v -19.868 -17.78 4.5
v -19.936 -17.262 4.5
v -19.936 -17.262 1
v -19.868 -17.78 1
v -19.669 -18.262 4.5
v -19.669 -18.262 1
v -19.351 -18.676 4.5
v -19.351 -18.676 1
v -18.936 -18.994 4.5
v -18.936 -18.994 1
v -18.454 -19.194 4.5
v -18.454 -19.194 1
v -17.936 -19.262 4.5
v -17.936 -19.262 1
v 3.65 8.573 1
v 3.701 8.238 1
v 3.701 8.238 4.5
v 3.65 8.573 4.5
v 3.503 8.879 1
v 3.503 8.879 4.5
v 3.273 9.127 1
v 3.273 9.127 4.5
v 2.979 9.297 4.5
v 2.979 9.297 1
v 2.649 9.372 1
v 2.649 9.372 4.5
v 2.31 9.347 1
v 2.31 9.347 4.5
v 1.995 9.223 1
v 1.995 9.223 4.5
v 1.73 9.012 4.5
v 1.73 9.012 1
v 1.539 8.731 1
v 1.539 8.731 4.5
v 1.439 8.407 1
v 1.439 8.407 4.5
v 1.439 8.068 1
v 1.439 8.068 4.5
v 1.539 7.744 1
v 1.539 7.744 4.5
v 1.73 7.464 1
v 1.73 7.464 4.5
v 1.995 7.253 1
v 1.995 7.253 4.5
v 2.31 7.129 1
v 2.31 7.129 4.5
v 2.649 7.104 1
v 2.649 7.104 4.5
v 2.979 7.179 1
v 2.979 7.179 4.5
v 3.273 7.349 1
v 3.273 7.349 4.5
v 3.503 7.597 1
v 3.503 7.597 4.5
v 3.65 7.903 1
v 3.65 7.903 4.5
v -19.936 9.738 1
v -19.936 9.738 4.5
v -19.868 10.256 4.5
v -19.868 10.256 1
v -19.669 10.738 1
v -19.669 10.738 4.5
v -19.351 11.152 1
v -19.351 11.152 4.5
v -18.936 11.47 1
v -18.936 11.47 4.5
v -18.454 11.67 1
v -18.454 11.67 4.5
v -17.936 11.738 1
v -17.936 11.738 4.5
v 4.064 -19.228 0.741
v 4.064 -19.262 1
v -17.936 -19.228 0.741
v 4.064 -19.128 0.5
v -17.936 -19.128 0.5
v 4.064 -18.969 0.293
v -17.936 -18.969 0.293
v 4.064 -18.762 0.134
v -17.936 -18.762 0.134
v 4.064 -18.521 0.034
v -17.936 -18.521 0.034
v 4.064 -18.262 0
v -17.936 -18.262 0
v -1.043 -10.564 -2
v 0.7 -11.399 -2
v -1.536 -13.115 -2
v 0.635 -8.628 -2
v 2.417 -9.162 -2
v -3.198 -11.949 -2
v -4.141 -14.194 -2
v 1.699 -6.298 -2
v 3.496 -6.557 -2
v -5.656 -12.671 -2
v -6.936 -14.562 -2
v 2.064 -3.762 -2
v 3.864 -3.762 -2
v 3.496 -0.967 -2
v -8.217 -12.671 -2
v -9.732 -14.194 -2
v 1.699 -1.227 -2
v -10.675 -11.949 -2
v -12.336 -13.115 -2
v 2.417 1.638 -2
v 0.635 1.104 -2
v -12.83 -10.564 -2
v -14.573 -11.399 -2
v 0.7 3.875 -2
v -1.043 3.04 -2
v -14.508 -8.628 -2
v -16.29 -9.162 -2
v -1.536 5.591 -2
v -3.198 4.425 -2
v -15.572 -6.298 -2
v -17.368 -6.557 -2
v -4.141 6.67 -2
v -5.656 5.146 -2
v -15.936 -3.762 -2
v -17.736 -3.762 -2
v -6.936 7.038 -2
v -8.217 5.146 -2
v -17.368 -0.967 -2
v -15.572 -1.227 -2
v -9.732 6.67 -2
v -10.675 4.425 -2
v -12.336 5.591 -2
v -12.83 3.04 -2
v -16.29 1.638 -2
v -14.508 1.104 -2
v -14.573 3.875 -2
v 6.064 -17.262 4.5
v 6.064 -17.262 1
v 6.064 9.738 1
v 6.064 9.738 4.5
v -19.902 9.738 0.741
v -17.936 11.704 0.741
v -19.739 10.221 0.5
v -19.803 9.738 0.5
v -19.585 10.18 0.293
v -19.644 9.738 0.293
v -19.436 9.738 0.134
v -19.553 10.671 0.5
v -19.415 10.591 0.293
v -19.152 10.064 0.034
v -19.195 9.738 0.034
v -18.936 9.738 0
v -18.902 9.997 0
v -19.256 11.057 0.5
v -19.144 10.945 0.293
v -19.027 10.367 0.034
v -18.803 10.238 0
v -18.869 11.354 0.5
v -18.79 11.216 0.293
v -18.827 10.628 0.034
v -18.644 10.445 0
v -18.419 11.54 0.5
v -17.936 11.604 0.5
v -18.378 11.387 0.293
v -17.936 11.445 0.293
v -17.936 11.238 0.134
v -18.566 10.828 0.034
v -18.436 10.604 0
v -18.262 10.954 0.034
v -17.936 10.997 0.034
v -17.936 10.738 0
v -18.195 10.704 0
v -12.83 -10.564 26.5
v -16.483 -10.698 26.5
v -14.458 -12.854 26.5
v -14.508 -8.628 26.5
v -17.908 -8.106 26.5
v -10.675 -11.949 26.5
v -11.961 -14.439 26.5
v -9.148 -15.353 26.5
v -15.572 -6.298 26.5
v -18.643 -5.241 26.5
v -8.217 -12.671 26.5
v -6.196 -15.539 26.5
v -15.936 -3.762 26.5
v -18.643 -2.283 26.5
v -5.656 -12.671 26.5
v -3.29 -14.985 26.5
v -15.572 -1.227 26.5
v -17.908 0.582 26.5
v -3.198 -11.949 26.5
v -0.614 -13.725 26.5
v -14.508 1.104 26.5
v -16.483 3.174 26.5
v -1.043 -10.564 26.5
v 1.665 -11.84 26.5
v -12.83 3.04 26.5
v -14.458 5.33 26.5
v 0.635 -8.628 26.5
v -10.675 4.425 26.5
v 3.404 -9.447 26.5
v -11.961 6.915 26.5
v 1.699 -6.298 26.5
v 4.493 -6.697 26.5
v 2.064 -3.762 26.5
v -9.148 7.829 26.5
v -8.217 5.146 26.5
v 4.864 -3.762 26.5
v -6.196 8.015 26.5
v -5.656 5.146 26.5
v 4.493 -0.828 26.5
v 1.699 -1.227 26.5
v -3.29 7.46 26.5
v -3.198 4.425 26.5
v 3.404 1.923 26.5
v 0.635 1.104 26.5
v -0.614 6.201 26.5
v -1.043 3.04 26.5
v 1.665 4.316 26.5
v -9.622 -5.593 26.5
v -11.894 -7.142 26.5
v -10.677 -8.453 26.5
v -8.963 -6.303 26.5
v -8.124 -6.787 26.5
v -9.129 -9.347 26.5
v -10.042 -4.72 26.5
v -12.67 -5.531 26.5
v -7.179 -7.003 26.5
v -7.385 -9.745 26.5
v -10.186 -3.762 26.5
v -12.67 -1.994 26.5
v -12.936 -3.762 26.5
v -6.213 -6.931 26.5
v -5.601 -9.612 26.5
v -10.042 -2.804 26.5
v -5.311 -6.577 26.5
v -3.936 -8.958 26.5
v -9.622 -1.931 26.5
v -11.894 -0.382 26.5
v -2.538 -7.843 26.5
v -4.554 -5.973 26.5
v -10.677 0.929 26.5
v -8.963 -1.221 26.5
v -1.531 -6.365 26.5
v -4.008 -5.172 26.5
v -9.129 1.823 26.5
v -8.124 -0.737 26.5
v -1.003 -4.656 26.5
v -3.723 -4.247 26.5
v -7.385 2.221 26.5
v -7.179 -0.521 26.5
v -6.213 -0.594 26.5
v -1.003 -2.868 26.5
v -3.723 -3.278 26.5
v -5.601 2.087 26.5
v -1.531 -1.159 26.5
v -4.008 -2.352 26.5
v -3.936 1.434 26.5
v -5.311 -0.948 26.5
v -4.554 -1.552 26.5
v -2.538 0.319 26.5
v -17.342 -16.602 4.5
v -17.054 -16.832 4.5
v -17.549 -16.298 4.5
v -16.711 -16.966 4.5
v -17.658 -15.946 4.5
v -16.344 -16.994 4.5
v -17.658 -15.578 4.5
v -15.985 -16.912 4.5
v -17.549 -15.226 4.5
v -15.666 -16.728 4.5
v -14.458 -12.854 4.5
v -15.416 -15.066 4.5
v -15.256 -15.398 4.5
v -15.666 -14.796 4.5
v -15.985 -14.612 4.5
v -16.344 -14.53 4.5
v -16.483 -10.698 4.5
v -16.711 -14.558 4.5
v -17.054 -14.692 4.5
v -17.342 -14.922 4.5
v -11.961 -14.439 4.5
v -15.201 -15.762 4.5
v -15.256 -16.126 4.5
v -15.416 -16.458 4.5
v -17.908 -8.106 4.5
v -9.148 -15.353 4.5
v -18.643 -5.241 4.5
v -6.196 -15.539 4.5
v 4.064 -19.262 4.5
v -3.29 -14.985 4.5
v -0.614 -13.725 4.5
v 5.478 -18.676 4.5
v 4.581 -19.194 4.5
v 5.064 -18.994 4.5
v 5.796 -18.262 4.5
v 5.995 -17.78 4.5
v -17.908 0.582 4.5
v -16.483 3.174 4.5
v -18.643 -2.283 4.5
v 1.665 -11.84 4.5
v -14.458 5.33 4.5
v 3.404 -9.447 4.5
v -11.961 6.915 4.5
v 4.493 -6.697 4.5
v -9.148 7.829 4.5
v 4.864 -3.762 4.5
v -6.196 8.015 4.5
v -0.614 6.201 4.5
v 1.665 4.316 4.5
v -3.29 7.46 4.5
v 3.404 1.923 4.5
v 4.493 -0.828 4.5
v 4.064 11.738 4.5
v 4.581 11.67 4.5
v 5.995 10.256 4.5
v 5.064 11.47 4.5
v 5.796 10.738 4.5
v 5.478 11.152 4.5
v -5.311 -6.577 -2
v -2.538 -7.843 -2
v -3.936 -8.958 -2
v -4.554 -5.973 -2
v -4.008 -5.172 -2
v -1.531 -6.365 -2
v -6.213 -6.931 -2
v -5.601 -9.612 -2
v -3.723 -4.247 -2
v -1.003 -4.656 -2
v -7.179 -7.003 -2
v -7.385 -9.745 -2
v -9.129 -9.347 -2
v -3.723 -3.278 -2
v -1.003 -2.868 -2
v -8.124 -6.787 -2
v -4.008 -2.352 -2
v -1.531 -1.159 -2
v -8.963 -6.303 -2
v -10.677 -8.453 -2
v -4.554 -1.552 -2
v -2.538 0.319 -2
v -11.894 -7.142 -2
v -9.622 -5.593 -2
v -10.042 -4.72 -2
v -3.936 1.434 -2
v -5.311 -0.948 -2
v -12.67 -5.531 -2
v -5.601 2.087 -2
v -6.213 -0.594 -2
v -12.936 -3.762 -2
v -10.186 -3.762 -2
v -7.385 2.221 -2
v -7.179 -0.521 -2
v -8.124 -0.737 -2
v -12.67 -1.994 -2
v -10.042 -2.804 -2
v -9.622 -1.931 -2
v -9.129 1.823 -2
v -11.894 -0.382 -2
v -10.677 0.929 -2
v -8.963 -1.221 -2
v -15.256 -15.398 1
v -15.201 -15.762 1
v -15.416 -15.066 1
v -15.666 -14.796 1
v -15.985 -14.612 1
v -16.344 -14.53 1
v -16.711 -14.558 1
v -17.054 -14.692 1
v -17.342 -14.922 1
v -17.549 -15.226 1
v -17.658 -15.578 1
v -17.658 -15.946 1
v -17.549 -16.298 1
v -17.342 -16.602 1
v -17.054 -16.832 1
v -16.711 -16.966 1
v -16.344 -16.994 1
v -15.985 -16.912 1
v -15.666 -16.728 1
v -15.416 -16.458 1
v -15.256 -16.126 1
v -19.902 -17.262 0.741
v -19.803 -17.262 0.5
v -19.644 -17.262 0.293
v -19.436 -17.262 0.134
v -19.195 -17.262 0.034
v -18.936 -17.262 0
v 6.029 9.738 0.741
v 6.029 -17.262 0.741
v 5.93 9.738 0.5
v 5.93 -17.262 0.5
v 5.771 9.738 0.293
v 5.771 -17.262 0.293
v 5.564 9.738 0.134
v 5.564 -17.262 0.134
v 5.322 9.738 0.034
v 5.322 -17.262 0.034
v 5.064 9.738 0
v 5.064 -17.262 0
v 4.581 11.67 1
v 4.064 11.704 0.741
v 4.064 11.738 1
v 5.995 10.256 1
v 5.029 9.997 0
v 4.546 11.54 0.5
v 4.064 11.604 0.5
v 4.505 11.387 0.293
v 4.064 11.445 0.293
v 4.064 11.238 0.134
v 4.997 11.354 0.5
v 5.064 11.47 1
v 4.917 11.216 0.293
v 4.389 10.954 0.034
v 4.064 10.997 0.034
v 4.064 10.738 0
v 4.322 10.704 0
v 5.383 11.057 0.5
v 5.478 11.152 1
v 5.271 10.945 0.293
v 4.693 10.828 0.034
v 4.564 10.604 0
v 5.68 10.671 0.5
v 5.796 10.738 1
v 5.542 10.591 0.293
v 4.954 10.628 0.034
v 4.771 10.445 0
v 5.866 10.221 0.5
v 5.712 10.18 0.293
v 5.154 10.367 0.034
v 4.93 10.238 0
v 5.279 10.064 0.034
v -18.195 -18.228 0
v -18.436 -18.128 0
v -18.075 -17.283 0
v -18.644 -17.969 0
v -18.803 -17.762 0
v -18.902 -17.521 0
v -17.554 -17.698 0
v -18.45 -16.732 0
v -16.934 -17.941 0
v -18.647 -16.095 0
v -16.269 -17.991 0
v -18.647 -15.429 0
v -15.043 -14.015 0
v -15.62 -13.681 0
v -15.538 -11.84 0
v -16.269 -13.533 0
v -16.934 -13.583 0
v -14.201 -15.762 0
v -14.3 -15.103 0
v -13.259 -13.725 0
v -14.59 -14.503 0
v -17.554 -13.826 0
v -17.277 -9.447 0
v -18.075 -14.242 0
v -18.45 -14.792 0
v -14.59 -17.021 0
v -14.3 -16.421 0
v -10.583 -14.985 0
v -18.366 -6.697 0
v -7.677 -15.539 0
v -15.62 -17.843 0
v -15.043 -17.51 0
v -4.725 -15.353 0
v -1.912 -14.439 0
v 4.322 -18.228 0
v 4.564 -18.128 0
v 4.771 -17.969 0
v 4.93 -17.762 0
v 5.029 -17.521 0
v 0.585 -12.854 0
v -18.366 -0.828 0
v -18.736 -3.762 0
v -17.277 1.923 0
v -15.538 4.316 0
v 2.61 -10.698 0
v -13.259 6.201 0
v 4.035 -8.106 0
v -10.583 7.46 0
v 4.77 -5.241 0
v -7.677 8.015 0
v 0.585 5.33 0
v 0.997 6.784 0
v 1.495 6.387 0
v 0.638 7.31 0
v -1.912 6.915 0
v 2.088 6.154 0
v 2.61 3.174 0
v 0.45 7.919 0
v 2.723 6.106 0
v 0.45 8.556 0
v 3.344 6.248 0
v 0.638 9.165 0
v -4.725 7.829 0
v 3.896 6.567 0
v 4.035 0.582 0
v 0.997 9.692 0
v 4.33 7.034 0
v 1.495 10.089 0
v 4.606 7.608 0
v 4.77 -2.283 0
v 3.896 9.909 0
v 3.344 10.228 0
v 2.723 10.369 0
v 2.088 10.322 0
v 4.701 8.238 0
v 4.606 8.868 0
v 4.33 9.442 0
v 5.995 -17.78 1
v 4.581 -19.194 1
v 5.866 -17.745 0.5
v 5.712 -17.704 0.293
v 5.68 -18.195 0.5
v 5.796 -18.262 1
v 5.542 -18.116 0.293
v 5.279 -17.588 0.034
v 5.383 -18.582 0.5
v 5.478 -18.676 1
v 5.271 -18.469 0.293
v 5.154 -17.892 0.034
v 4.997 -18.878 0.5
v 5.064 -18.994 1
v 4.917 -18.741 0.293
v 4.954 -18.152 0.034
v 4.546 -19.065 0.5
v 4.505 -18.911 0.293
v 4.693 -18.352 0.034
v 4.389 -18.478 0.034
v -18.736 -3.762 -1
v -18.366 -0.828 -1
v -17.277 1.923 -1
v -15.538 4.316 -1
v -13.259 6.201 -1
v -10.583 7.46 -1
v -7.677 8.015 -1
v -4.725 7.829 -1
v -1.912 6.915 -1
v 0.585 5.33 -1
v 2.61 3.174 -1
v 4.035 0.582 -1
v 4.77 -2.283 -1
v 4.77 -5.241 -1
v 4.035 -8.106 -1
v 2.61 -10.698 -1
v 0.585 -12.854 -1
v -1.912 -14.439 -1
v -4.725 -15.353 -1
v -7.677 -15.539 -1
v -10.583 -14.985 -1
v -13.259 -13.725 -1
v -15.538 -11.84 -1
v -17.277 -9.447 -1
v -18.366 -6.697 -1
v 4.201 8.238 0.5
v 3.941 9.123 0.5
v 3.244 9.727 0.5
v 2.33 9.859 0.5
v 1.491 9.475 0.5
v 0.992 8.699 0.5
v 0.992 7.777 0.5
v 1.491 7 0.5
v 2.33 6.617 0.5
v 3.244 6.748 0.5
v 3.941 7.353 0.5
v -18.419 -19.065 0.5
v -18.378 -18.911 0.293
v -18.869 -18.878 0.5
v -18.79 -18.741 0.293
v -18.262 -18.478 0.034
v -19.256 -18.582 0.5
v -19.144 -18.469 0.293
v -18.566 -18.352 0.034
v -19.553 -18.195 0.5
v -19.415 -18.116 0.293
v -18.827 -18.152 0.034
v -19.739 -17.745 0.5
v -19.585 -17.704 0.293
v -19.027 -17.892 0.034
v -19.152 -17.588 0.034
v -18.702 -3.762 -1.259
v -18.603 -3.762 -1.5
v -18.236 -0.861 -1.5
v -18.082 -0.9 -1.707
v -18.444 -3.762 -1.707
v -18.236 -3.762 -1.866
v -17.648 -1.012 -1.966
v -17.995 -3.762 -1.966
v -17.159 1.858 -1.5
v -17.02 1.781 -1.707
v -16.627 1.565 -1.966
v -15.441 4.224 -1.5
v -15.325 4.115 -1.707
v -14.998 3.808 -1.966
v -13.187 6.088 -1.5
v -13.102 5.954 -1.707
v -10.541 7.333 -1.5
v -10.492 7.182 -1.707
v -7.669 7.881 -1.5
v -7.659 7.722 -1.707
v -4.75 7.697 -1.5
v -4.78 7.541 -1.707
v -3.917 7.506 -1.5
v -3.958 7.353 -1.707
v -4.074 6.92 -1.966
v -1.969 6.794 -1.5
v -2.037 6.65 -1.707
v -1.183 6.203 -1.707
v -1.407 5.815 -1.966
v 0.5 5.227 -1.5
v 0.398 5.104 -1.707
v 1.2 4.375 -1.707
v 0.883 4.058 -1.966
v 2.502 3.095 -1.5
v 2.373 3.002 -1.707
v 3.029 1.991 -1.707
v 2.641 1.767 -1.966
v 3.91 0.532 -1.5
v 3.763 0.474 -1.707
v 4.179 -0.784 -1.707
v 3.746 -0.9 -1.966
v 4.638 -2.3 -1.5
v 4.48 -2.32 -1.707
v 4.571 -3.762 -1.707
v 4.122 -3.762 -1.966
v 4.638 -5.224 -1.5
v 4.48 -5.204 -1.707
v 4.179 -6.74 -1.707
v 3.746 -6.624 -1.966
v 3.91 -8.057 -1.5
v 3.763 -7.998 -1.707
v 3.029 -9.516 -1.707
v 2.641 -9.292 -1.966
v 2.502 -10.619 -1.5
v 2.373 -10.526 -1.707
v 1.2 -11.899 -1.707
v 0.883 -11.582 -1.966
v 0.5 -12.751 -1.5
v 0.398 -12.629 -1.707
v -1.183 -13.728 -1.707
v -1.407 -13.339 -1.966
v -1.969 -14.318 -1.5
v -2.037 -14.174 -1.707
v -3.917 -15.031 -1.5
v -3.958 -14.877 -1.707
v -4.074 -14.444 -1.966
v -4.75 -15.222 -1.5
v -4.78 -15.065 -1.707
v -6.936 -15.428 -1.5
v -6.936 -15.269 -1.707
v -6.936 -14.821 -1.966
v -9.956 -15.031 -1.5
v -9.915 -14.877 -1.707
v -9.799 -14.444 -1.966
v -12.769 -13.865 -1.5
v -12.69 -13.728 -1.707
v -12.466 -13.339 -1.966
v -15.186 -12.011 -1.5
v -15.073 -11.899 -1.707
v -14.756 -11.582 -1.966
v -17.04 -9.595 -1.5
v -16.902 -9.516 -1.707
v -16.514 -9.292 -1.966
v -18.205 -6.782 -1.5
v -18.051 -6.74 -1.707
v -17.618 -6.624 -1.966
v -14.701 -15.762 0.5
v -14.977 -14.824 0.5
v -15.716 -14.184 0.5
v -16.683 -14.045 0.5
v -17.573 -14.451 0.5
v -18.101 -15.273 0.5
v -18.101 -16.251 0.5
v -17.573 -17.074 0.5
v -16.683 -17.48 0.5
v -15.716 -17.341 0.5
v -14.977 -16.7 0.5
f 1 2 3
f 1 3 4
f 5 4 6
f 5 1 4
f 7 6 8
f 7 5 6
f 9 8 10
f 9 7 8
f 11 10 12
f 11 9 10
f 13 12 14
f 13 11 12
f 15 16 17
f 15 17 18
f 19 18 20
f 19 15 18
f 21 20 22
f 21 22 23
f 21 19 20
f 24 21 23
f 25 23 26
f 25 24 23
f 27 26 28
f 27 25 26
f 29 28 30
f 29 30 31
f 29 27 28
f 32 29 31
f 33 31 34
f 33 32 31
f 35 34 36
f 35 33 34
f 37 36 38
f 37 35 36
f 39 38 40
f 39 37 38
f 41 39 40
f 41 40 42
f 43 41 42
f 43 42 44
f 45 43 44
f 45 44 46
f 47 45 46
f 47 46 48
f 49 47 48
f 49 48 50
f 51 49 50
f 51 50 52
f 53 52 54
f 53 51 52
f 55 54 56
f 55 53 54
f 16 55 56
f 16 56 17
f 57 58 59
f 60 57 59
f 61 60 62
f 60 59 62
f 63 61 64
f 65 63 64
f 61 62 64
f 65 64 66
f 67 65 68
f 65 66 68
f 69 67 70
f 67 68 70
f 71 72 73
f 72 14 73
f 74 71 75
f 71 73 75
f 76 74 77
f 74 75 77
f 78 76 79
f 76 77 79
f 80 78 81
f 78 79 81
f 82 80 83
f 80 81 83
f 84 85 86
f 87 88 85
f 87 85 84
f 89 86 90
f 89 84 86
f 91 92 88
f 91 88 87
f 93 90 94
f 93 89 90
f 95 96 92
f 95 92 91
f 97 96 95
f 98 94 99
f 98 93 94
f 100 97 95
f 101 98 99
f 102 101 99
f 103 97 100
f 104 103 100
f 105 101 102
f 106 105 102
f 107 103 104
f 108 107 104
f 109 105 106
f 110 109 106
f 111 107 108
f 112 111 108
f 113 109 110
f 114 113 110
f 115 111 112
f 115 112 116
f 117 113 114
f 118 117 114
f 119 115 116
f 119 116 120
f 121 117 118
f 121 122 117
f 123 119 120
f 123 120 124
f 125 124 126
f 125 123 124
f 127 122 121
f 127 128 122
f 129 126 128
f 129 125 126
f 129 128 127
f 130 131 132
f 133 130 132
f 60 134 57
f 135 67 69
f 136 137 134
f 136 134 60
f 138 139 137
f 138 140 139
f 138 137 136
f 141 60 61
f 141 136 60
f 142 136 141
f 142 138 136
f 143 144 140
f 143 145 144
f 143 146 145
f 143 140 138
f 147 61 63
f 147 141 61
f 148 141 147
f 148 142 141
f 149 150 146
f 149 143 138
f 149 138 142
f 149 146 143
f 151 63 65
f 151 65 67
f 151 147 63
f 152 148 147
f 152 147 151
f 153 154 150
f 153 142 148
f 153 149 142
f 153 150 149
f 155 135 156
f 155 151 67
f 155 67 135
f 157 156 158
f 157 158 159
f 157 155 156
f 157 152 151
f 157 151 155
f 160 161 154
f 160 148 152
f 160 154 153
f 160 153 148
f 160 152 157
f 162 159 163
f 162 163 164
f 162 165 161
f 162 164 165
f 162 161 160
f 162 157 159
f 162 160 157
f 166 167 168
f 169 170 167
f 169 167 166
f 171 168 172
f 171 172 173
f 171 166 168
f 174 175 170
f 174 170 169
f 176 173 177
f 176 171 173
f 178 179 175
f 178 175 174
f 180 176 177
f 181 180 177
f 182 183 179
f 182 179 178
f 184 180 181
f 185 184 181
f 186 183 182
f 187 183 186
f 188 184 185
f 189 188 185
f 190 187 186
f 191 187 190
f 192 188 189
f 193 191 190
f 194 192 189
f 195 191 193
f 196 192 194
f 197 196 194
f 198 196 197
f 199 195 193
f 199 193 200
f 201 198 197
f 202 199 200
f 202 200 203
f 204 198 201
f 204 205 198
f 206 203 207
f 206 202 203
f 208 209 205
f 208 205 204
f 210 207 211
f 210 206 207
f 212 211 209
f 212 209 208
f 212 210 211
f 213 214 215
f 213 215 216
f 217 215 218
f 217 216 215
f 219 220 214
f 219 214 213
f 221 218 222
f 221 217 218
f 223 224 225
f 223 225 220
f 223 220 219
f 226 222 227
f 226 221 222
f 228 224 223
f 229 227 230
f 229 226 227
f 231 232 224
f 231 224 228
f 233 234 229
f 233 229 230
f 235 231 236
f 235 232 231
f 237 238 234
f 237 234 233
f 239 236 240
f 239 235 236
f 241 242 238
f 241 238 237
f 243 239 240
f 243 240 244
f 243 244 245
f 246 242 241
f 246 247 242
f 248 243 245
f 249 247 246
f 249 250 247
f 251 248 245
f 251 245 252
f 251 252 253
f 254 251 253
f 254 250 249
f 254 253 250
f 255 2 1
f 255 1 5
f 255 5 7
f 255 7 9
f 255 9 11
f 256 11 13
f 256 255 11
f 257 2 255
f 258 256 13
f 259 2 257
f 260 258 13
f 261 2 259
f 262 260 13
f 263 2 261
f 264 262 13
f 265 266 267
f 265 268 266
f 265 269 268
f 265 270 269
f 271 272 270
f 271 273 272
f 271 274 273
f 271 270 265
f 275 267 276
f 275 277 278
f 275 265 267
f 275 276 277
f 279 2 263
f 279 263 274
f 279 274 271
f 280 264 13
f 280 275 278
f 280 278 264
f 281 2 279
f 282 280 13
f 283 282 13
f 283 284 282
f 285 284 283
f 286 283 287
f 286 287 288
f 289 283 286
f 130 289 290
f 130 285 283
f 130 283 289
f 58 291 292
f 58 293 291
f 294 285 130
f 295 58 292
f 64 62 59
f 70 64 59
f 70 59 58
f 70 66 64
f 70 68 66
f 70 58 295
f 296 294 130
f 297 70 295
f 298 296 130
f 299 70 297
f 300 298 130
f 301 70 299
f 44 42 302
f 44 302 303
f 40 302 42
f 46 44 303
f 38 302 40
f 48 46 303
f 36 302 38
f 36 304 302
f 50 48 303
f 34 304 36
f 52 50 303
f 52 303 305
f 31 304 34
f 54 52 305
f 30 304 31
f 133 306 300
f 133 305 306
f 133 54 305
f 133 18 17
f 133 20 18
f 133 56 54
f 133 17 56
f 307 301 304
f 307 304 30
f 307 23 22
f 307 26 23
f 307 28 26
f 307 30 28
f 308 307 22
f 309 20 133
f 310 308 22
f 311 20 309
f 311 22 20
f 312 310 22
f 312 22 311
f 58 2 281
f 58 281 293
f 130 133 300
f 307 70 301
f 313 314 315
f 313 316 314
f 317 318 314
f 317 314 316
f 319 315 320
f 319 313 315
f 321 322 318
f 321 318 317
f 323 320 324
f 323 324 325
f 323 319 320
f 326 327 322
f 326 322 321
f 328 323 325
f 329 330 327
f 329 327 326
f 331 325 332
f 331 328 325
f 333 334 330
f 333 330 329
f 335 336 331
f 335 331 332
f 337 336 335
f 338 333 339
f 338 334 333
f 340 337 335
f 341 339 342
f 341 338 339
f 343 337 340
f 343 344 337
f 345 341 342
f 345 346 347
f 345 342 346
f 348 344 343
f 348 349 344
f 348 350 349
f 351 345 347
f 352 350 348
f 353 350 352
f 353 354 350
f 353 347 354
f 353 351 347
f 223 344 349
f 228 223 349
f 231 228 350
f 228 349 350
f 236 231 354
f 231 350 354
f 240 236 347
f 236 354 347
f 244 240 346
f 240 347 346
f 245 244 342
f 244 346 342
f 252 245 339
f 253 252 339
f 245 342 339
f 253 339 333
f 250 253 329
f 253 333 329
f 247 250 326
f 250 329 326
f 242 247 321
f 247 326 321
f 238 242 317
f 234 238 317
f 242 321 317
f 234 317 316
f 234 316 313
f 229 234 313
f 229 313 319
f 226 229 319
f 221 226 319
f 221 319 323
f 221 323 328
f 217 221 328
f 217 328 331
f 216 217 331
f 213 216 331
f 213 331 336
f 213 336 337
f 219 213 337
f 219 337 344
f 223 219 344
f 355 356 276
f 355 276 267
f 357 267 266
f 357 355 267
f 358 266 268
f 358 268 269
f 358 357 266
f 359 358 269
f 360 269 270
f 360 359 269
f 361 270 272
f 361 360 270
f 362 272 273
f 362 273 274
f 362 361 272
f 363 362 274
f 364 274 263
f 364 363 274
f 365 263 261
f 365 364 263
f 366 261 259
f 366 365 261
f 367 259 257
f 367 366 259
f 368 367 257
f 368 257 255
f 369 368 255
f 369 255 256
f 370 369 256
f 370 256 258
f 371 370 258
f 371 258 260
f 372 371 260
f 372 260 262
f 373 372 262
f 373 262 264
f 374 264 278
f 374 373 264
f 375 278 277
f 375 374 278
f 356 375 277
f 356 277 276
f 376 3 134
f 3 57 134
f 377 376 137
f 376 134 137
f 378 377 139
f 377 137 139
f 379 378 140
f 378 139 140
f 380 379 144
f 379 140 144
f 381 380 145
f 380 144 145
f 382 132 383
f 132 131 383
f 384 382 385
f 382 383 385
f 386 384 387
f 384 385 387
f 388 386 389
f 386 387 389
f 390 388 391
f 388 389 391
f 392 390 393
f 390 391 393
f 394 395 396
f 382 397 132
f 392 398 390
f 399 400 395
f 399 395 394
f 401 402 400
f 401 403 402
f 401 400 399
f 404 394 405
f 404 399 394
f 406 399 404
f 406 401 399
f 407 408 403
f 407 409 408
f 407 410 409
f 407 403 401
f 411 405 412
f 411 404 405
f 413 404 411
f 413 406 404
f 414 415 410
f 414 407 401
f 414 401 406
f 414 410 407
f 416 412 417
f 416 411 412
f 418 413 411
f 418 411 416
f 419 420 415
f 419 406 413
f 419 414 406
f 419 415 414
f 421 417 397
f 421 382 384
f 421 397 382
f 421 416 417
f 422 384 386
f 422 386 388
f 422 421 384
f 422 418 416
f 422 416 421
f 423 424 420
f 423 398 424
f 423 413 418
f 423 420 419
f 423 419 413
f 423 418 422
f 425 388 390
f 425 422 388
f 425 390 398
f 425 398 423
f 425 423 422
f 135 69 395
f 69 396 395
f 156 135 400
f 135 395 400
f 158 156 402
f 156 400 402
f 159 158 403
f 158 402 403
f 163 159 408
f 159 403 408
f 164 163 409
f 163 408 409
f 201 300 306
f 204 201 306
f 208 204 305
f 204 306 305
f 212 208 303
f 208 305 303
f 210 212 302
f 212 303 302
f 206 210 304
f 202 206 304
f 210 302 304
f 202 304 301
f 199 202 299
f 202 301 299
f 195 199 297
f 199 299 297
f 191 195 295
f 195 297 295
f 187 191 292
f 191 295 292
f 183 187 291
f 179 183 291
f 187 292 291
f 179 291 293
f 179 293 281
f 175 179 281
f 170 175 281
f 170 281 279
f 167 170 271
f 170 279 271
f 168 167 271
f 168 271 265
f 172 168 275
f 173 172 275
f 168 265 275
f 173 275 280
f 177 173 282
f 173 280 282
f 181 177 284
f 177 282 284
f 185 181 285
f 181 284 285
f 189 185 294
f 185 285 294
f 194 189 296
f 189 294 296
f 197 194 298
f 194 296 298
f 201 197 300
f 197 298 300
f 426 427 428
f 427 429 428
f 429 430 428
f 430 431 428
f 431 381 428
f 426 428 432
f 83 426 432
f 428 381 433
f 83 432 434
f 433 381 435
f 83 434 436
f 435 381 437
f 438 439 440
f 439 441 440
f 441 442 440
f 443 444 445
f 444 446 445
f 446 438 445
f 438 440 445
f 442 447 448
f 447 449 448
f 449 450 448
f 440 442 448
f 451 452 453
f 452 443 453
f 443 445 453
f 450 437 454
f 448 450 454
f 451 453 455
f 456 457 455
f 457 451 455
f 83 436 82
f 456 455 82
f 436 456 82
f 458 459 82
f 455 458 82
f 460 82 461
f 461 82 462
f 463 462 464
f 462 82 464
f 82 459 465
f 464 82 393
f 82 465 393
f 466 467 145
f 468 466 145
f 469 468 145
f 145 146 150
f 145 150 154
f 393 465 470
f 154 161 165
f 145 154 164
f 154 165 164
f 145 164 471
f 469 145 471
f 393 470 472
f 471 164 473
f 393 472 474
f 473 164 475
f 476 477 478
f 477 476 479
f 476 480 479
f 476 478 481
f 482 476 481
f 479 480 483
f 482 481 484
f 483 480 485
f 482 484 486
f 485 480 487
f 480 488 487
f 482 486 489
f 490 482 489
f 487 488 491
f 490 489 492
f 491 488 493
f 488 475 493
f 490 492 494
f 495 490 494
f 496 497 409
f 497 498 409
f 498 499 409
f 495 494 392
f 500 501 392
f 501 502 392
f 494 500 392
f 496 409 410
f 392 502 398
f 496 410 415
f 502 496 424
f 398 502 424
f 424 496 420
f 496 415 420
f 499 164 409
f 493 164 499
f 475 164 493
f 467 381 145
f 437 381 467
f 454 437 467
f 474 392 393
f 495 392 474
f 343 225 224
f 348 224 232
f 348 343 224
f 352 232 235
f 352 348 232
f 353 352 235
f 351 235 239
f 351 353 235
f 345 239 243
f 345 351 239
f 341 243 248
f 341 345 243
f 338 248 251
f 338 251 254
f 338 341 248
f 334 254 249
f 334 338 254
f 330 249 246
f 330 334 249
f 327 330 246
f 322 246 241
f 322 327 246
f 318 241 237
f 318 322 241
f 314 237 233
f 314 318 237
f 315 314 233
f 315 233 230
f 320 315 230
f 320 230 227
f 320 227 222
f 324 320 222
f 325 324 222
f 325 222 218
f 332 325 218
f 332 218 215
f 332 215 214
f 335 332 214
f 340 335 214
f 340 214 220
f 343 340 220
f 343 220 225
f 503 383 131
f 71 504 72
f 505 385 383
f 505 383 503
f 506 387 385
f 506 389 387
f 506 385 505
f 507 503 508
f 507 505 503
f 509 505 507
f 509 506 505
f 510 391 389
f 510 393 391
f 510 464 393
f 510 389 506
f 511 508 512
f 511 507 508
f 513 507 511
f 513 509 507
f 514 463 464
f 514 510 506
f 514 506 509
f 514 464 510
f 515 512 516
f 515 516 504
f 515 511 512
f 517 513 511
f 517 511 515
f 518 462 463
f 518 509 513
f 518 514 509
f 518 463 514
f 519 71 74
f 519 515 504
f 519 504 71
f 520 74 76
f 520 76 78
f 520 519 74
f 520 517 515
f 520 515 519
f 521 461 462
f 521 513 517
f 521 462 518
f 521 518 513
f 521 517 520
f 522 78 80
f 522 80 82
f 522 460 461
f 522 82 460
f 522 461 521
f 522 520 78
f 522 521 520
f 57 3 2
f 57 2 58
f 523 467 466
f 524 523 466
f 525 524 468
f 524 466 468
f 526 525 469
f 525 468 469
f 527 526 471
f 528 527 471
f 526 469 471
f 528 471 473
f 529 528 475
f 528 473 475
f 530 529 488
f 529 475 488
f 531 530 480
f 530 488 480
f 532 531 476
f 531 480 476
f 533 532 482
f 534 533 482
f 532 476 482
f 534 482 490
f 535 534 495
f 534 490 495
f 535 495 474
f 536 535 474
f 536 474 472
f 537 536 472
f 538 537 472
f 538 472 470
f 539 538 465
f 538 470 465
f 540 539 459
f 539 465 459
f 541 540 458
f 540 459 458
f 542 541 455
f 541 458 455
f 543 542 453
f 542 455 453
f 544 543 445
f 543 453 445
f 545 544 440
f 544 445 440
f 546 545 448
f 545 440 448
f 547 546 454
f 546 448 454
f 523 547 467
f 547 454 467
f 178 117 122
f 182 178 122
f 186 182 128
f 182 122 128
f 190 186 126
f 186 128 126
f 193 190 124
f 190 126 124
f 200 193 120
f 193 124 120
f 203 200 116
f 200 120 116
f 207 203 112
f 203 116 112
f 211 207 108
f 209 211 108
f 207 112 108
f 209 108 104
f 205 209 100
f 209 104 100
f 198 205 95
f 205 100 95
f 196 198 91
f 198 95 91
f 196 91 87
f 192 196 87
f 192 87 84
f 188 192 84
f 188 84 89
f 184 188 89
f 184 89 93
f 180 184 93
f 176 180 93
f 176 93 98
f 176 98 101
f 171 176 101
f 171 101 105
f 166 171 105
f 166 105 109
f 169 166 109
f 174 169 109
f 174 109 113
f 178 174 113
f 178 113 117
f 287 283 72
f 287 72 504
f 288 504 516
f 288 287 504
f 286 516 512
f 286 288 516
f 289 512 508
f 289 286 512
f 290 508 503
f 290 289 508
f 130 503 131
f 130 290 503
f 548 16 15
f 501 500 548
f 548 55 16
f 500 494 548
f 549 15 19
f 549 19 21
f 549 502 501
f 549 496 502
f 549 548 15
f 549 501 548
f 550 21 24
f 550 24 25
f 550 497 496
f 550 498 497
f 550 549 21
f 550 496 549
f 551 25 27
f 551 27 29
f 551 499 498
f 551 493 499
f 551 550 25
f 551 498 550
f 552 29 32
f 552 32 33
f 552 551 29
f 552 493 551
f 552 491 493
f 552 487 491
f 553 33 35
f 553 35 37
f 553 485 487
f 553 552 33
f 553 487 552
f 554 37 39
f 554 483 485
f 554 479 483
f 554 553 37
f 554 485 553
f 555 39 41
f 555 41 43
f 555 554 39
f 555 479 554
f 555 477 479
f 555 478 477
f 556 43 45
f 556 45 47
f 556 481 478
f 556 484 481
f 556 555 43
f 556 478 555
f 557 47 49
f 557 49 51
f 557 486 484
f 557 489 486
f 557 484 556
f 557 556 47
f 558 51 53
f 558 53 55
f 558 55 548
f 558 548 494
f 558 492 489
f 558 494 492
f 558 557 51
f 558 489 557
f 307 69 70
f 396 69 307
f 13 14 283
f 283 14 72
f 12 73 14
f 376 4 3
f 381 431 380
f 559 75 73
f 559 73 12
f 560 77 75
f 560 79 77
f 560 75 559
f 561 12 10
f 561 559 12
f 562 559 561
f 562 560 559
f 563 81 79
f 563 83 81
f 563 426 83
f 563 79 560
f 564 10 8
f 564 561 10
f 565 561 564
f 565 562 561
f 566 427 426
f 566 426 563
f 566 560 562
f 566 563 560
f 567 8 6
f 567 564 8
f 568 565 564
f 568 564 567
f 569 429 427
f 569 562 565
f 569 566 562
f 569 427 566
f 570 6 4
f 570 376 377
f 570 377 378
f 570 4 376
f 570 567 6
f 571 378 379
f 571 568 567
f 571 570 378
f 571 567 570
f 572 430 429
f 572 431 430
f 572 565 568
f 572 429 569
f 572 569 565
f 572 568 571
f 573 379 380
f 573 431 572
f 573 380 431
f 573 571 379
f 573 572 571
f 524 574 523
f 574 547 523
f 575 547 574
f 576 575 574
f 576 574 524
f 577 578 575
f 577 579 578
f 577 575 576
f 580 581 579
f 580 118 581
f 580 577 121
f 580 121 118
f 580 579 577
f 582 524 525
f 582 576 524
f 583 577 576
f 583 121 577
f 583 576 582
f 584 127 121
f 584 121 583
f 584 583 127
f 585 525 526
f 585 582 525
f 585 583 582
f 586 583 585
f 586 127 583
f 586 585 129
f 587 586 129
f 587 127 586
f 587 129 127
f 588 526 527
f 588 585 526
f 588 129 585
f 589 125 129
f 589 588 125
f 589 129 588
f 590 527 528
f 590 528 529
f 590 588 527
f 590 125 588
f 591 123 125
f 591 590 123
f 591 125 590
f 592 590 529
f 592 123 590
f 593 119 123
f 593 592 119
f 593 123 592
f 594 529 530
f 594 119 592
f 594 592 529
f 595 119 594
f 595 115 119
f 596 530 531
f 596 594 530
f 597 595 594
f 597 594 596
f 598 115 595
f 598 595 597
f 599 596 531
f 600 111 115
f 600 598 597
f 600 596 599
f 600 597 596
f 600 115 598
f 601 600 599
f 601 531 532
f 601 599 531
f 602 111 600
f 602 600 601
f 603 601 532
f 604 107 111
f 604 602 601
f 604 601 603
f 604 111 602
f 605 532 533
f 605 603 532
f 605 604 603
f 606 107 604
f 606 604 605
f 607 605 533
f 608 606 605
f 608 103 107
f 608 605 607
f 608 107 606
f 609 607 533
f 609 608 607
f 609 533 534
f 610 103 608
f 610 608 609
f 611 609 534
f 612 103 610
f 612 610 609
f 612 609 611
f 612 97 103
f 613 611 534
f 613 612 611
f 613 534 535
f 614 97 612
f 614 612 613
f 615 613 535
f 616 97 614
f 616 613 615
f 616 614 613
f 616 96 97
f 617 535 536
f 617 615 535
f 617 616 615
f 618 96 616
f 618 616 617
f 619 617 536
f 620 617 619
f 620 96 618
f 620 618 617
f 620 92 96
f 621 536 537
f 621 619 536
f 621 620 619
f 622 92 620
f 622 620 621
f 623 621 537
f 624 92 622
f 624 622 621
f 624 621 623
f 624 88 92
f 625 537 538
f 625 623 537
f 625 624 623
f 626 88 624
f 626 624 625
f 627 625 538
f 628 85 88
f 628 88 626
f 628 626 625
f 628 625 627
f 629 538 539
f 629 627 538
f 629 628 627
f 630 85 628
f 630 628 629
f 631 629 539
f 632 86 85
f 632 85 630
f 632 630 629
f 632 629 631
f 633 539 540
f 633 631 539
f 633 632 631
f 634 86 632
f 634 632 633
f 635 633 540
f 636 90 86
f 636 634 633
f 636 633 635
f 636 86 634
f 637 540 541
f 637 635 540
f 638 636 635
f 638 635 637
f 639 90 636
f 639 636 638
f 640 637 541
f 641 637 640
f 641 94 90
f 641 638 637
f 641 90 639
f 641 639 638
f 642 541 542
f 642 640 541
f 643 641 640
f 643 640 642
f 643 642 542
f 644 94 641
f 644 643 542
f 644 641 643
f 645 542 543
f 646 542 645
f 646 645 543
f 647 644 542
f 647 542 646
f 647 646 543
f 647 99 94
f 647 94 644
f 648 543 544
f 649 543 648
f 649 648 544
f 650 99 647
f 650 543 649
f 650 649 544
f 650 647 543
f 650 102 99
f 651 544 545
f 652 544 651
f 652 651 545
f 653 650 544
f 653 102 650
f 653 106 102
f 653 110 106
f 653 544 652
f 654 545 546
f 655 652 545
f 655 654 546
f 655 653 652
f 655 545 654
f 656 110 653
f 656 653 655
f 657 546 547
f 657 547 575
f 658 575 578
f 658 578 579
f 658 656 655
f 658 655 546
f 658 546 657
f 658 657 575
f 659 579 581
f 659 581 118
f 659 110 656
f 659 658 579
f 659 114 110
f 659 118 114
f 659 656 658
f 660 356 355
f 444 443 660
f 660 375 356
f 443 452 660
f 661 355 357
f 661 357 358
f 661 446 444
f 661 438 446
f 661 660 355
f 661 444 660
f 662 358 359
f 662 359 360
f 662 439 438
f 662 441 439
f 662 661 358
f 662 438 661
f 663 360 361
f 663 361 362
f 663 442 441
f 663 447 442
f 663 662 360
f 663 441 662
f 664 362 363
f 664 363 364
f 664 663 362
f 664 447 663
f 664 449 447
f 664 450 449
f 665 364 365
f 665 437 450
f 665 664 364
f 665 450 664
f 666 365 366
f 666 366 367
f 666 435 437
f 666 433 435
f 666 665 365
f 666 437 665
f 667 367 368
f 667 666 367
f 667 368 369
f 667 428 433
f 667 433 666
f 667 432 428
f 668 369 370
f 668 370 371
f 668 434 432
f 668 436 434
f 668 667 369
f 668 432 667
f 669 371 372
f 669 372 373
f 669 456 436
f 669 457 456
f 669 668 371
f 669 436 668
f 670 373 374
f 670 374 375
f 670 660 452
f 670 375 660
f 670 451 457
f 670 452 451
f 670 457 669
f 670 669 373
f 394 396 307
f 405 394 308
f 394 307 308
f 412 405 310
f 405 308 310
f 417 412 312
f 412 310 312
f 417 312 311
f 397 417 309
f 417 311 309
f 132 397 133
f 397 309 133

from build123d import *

# Parameters (mm, degrees)
ESQUISSE1_W             = 26
ESQUISSE1_H             = 31
ESQUISSE1_R             = 1.137507792
ESQUISSE1_R_2           = 1.235295656
BOSS_EXTRU_1_DEPTH      = 4.5
CHANFREIN1_SIZE         = 1
CONG_1_R                = 2
CONG_2_R                = 1
ESQUISSE2_R             = 11.8
BOSS_EXTRU_2_DEPTH      = 2
CONG_3_R                = 1
ESQUISSE3_R             = 11.8
BOSS_EXTRU_3_DEPTH      = 22
ESQUISSE4_R             = 9
ESQUISSE4_R_2           = 6
ESQUISSE4_R_3           = 3.25
ENL_V_MAT_EXTRU_1_DEPTH = 30


with BuildPart() as part:
    # Esquisse1 → Boss.-Extru.1 (new body)
    with BuildSketch(Plane.XY):
        with Locations((-6.9364829, -3.762135922)):
            Rectangle(ESQUISSE1_W, ESQUISSE1_H)
        with Locations((2.5635171, 8.237864078)):
            Circle(ESQUISSE1_R, mode=Mode.SUBTRACT)
        with Locations((-16.4364829, -15.762135922)):
            Circle(ESQUISSE1_R_2, mode=Mode.SUBTRACT)
    extrude(amount=BOSS_EXTRU_1_DEPTH)

    # Chanfrein1
    chanfrein1_edges = [part.edges().sort_by_distance(p)[0] for p in [
        (1.426009307, 8.237864078, 0),
        (-17.671778557, -15.762135922, 0),
    ]]
    chamfer(chanfrein1_edges, length=CHANFREIN1_SIZE)

    # Congé1
    cong_1_edges = [part.edges().sort_by_distance(p)[0] for p in [
        (-19.9364829, 11.737864078, 2.25),
        (6.0635171, 11.737864078, 2.25),
        (6.0635171, -19.262135922, 2.25),
        (-19.9364829, -19.262135922, 2.25),
    ]]
    fillet(cong_1_edges, radius=CONG_1_R)

    # Congé2
    cong_2_edges = [part.edges().sort_by_distance(p)[0] for p in [
        (-6.9364829, 11.737864078, 0),
        (-19.9364829, -3.762135922, 0),
        (6.0635171, -3.762135922, 0),
        (-6.9364829, -19.262135922, 0),
        (-19.350696463, 11.15207764, 0),
        (-19.350696463, -18.676349485, 0),
        (5.477730662, -18.676349485, 0),
        (5.477730662, 11.15207764, 0),
    ]]
    fillet(cong_2_edges, radius=CONG_2_R)

    # Esquisse2 → Boss.-Extru.2 (add)
    with BuildSketch(Plane(origin=(0, 0, 0), x_dir=(-1, 0, 0), z_dir=(0, 0, -1))):
        with Locations((6.9364829, -3.762135922)):
            Circle(ESQUISSE2_R)
    extrude(amount=BOSS_EXTRU_2_DEPTH)

    # Congé3
    cong_3_edges = [part.edges().sort_by_distance(p)[0] for p in [
        (4.8635171, -3.762135922, -2),
    ]]
    fillet(cong_3_edges, radius=CONG_3_R)

    # Esquisse3 → Boss.-Extru.3 (add)
    with BuildSketch(Plane.XY.offset(4.5)):
        with Locations((-6.9364829, -3.762135922)):
            Circle(ESQUISSE3_R)
    extrude(amount=BOSS_EXTRU_3_DEPTH)

    # Esquisse4 → Enlèv. mat.-Extru.1 (cut)
    with BuildSketch(Plane(origin=(0, 0, -2), x_dir=(-1, 0, 0), z_dir=(0, 0, -1))):
        with Locations((6.9364829, -3.762135922)):
            Circle(ESQUISSE4_R)
        with Locations((6.9364829, -3.762135922)):
            Circle(ESQUISSE4_R_2, mode=Mode.SUBTRACT)
        with Locations((6.9364829, -3.762135922)):
            Circle(ESQUISSE4_R_3)
    extrude(amount=-ENL_V_MAT_EXTRU_1_DEPTH, mode=Mode.SUBTRACT)


solid = part.part
